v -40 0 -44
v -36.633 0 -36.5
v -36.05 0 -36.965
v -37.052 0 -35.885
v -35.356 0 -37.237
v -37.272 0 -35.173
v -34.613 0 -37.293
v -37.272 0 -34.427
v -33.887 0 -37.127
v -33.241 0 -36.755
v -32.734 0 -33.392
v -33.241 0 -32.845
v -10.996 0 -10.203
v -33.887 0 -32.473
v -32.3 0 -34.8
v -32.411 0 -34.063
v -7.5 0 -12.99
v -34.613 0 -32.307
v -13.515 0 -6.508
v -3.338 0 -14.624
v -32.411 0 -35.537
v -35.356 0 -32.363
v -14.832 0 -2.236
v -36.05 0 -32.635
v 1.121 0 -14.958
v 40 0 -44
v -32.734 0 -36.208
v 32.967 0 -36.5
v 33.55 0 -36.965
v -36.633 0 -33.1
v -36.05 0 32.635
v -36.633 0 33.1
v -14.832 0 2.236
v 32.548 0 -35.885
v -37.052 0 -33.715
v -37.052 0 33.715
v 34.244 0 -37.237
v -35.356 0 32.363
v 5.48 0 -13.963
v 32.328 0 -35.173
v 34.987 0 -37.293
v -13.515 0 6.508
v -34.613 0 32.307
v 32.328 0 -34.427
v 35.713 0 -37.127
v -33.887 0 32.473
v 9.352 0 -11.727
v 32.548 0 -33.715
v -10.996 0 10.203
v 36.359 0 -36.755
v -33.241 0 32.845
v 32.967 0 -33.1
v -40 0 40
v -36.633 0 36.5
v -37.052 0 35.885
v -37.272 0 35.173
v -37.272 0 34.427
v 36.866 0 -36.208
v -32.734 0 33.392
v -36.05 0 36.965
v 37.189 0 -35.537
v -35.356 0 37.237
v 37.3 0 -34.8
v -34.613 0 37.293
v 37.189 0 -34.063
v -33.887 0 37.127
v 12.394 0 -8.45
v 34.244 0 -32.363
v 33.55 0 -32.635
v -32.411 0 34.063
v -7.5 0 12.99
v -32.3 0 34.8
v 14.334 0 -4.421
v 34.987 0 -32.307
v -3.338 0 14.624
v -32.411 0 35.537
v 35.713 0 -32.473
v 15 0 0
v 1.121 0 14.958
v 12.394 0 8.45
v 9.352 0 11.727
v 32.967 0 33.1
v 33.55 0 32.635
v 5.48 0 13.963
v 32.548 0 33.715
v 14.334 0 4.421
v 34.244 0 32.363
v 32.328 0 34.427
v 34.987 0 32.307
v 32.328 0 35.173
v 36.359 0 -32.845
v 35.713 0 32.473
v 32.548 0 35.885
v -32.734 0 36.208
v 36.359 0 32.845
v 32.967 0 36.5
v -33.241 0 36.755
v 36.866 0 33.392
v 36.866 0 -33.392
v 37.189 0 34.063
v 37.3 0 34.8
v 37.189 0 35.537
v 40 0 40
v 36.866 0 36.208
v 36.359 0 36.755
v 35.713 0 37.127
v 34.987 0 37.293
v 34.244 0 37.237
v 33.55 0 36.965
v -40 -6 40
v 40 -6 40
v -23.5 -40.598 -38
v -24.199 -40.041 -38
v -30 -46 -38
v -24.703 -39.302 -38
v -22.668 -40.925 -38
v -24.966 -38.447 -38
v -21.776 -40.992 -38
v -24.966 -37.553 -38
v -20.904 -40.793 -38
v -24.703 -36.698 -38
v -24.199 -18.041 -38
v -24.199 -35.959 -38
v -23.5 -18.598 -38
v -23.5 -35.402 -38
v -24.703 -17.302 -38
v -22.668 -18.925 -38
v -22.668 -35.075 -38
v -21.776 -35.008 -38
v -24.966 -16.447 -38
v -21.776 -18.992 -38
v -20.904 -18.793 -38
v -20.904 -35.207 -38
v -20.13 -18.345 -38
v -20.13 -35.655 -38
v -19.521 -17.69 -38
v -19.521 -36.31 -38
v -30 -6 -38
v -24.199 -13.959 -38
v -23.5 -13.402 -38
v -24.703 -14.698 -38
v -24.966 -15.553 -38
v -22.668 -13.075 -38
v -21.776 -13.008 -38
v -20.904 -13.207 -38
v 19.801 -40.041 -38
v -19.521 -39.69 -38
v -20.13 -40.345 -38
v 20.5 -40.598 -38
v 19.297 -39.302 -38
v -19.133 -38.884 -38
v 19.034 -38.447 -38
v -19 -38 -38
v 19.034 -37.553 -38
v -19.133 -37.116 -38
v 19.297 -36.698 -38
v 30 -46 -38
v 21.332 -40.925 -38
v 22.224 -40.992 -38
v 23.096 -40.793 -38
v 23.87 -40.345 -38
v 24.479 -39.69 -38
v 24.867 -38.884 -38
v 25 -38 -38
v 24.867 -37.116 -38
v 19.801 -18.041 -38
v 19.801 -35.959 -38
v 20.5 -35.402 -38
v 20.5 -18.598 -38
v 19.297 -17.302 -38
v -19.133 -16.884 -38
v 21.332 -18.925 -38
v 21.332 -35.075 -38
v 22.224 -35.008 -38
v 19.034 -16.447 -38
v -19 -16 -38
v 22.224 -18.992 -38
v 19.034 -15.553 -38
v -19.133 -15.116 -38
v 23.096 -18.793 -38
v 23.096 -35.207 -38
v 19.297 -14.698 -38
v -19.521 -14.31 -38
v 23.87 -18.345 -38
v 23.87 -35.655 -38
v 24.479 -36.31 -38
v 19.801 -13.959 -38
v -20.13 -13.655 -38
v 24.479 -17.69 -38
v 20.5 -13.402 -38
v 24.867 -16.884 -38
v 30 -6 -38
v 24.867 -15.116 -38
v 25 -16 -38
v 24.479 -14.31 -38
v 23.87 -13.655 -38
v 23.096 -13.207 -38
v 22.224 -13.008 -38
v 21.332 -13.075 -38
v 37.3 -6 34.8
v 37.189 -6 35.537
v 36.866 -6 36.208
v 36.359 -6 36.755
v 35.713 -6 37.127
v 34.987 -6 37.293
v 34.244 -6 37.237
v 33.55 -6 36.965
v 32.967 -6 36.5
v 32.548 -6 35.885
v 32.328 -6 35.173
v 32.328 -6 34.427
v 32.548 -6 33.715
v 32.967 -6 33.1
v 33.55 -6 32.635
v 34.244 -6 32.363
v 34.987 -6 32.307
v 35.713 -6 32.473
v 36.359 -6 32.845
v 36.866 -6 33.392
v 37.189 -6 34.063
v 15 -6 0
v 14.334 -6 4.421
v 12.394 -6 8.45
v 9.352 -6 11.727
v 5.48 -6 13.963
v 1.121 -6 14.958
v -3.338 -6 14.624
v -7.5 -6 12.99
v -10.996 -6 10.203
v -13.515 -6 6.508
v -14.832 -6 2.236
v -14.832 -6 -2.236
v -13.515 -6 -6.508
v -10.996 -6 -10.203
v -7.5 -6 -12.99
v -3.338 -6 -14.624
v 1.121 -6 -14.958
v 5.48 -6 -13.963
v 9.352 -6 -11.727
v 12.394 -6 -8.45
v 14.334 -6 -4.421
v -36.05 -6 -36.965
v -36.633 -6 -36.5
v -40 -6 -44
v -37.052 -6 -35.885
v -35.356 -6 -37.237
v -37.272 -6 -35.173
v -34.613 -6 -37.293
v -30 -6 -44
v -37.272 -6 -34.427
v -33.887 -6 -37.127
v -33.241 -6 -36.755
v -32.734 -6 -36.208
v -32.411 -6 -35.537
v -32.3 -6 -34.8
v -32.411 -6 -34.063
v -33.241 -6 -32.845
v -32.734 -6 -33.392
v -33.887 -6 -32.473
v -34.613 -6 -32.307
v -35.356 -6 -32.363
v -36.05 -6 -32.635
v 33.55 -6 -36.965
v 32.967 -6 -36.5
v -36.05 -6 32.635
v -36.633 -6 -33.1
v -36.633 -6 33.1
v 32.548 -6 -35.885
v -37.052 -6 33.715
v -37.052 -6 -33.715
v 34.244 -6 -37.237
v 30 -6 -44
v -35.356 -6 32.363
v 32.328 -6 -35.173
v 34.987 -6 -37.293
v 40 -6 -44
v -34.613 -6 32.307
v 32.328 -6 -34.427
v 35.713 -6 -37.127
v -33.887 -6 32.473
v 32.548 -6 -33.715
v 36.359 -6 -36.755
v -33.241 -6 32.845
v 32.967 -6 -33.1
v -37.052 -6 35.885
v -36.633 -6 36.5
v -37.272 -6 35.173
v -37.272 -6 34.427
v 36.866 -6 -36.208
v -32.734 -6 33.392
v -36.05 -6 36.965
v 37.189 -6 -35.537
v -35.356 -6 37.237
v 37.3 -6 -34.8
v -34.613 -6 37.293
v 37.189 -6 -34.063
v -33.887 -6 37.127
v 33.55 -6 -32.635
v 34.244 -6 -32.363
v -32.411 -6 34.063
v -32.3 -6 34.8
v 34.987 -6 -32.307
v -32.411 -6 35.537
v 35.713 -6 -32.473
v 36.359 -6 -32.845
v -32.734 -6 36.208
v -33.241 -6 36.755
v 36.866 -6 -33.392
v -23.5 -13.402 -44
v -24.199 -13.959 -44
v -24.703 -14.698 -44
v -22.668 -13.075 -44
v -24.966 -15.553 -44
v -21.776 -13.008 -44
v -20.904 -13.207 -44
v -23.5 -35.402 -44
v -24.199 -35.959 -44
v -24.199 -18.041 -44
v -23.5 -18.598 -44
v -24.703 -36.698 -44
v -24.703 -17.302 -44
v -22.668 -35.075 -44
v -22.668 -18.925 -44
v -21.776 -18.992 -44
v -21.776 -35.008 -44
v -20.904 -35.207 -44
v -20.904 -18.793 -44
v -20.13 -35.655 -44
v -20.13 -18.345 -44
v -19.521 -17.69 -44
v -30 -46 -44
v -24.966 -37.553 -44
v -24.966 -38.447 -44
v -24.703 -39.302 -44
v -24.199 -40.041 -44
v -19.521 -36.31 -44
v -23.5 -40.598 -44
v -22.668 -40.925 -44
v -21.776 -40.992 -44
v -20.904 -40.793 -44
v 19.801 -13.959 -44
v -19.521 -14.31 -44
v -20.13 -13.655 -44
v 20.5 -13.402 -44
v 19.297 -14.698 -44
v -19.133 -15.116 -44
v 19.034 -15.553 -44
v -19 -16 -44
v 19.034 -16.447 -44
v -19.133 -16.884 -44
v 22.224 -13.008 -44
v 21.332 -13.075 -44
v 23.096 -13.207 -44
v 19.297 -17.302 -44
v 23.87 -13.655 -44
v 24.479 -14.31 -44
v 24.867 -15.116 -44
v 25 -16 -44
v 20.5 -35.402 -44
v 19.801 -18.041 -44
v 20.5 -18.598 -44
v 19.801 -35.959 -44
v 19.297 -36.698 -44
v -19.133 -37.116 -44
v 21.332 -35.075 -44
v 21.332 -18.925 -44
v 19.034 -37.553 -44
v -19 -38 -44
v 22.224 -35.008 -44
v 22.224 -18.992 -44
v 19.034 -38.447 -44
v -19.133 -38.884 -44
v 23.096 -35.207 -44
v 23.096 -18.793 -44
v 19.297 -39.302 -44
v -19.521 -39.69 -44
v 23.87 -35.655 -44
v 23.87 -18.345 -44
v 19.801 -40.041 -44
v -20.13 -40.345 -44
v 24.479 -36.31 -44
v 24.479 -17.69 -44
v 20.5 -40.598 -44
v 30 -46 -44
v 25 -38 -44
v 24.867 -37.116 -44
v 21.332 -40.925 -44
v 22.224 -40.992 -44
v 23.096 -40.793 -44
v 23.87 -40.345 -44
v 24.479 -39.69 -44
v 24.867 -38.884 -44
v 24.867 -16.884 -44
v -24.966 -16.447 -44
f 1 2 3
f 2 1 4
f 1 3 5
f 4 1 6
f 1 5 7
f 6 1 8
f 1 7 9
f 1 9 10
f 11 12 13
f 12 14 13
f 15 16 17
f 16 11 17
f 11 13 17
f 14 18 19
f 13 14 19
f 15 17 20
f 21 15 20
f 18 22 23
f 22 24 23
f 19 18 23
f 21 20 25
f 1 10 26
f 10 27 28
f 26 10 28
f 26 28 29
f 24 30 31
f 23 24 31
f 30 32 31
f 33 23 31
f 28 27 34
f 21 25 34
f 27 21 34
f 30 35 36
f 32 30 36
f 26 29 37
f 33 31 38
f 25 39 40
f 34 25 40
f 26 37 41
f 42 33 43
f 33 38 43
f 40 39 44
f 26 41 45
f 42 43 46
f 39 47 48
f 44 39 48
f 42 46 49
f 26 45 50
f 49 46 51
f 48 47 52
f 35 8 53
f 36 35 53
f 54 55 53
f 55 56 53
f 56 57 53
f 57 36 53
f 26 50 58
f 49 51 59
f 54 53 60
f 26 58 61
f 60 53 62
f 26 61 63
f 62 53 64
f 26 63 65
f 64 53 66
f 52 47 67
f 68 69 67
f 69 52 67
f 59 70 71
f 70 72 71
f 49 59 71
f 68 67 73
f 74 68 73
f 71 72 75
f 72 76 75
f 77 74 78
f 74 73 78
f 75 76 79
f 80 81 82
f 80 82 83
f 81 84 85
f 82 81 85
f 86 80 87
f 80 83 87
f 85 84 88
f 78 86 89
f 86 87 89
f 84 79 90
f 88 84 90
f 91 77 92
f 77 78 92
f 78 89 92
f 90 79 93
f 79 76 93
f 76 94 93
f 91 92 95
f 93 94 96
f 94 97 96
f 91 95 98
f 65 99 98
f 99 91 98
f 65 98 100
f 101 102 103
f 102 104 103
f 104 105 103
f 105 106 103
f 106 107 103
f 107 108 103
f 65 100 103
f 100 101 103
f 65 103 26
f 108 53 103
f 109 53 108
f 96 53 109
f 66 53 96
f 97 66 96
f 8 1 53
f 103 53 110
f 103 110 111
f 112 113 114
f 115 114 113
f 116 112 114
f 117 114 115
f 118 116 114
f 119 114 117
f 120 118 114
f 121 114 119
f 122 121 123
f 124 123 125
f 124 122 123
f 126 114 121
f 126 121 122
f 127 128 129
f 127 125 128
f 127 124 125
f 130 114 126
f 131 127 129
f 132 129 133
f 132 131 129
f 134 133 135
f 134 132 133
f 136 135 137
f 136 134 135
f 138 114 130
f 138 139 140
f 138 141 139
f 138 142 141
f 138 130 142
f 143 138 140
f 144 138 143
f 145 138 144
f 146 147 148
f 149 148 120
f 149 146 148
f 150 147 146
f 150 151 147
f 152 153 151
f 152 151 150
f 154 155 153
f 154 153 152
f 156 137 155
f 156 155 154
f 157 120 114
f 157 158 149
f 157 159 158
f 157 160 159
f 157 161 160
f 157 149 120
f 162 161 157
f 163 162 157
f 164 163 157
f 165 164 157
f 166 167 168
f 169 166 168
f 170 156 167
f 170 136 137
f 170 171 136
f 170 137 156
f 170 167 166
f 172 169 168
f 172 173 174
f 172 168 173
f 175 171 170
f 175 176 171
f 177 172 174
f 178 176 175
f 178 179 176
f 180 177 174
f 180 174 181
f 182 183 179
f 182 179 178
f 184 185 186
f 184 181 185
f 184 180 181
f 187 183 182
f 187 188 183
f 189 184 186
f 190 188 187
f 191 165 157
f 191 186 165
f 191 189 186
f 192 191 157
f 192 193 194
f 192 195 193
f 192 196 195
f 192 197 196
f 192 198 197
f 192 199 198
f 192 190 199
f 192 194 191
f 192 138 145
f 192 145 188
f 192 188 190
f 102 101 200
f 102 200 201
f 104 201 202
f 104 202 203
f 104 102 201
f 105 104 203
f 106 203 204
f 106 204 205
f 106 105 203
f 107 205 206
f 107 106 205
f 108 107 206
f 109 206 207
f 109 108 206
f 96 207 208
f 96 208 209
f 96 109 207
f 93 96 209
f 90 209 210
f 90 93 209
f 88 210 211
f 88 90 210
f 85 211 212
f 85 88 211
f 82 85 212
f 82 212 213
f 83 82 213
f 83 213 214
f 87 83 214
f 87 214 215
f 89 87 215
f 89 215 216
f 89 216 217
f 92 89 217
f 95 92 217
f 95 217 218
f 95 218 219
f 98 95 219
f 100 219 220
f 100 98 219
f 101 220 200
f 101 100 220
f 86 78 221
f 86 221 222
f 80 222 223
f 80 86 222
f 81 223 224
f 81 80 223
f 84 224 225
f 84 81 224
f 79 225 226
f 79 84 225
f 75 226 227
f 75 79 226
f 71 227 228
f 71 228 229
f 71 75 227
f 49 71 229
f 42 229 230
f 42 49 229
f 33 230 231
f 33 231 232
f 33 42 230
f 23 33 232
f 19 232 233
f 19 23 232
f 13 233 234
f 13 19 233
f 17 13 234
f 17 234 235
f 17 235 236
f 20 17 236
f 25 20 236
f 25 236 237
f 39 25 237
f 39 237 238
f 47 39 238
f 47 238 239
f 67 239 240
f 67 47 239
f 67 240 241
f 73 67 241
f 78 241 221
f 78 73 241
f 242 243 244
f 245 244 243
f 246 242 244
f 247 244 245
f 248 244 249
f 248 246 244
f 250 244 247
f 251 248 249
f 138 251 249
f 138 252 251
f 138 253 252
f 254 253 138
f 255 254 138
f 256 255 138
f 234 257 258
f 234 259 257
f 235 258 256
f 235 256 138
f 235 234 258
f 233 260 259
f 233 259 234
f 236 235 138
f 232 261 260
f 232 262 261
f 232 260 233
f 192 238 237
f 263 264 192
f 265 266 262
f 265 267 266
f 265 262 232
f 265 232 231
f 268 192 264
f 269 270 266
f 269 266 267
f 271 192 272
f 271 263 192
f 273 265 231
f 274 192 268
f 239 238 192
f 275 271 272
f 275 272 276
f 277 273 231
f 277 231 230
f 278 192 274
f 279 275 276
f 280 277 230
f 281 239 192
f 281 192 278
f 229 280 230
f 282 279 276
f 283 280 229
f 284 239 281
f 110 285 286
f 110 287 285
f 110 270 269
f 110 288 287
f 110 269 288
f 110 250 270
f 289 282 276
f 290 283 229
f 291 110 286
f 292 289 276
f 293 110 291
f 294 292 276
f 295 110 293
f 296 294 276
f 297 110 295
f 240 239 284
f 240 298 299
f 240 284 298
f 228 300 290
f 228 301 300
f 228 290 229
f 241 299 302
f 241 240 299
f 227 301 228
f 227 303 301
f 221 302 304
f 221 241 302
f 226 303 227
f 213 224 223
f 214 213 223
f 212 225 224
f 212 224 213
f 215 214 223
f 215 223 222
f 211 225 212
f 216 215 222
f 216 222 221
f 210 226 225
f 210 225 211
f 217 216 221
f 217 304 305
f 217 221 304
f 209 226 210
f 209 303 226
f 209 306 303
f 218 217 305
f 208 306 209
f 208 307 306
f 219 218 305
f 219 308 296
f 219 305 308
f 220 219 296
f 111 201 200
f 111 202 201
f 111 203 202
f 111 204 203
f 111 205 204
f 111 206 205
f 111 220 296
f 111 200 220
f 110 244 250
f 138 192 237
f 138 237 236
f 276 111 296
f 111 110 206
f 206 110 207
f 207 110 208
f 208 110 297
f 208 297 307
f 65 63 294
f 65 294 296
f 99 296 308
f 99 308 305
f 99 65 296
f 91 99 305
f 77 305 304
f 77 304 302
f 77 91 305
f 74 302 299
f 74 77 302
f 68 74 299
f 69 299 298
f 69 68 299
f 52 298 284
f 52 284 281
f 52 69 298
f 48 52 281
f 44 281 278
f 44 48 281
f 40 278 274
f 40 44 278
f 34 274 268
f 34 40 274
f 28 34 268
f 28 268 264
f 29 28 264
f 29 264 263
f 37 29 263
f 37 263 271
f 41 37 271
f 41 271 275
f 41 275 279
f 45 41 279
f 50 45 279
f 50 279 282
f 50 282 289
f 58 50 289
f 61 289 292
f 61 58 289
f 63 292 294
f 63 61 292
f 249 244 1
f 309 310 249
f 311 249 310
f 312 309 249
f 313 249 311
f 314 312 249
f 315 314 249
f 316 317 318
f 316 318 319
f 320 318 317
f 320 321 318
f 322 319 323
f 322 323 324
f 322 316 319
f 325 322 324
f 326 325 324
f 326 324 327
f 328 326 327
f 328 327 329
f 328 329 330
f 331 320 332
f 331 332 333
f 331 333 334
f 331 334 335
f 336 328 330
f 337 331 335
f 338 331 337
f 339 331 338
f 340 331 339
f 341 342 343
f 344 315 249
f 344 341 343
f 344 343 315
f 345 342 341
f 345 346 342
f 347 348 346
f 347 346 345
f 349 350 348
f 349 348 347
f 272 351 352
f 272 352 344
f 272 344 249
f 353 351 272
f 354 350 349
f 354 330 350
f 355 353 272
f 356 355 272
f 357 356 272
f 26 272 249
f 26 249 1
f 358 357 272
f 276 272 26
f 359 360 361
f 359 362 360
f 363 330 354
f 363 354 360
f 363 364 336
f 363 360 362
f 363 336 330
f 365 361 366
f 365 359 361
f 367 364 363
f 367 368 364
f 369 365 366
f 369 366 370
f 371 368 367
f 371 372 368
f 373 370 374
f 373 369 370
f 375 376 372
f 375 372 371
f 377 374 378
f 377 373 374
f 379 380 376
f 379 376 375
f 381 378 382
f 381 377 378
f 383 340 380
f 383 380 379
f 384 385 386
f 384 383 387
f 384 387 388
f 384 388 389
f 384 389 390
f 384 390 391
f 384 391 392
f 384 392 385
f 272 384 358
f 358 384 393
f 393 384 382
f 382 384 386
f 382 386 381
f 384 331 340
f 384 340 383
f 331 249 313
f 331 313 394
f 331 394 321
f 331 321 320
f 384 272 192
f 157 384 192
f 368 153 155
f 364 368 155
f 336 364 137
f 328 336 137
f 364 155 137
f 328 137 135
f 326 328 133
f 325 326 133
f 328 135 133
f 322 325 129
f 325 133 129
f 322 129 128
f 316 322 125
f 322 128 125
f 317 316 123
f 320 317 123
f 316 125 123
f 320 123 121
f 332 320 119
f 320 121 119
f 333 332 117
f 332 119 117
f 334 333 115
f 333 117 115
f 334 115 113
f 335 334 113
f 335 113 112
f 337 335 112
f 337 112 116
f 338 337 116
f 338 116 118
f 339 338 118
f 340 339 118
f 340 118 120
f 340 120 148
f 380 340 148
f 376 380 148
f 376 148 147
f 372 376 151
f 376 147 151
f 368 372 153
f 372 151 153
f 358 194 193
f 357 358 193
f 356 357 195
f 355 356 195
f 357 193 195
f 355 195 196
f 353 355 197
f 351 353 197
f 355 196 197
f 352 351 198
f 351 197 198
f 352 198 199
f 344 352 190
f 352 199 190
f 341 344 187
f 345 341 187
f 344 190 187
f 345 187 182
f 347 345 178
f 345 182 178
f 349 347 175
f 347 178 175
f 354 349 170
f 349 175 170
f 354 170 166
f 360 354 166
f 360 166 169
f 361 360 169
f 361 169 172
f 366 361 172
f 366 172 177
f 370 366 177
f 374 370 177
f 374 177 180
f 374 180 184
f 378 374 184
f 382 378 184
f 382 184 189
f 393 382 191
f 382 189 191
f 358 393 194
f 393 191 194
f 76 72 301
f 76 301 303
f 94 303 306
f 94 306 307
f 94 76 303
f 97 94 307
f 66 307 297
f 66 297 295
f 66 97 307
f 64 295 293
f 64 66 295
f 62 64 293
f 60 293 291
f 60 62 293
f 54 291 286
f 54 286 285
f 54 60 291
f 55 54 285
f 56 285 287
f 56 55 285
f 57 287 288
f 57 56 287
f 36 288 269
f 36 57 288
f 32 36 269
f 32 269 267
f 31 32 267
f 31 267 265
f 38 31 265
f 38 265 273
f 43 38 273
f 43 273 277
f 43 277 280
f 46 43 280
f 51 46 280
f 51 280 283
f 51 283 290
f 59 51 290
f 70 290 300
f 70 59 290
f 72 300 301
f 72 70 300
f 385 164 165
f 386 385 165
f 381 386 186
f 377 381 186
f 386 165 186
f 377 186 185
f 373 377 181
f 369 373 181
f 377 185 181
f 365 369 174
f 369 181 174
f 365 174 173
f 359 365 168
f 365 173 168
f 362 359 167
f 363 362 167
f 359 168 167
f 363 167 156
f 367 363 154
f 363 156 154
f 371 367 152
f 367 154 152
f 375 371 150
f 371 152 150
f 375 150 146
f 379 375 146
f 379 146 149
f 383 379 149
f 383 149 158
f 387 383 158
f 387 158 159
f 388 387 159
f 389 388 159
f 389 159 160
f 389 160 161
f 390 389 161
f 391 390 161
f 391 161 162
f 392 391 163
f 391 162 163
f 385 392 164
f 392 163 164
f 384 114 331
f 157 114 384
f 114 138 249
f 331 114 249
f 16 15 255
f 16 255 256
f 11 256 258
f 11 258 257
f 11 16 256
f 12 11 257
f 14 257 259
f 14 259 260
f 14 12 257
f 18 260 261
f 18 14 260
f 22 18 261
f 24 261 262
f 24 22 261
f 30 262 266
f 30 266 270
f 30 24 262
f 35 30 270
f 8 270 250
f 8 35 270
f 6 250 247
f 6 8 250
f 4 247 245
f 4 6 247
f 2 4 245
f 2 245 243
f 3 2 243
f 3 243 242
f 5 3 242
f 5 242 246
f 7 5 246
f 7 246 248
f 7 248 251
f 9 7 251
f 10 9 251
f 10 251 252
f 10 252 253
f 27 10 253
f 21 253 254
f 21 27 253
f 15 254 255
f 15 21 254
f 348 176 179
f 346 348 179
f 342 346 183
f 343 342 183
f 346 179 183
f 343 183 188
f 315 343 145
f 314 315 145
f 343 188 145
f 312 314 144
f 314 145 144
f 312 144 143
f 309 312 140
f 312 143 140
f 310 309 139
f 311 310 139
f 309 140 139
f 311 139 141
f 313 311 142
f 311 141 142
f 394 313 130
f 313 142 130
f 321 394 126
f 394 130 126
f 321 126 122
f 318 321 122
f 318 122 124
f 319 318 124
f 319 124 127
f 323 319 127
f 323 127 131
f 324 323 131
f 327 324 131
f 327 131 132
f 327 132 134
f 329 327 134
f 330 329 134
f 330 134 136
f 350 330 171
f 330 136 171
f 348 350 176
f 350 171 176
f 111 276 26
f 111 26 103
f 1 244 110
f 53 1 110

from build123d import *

# Parameters (mm, degrees)
F0_W     = 80
F0_H     = 80
F0_R     = 2.5
F0_R_2   = 15
F1_DEPTH = 6
F2_W     = 60
F2_H     = 2
F2_H_2   = 4
F3_DEPTH = 40
F4_R     = 3
F5_DEPTH = 6
F6_W     = 80
F6_H     = 4
F7_DEPTH = 6


with BuildPart() as f1:
    # F0 (on Front) → F1 (new body)
    with BuildSketch(Plane.XZ):
        Rectangle(F0_W, F0_H)
        with Locations((-34.8, -34.8)):
            Circle(F0_R, mode=Mode.SUBTRACT)
        with Locations((34.8, -34.8)):
            Circle(F0_R, mode=Mode.SUBTRACT)
        with Locations((-34.8, 34.8)):
            Circle(F0_R, mode=Mode.SUBTRACT)
        Circle(F0_R_2, mode=Mode.SUBTRACT)
        with Locations((34.8, 34.8)):
            Circle(F0_R, mode=Mode.SUBTRACT)
    extrude(amount=F1_DEPTH)

    # F2 (on face) → F3 (join)
    with BuildSketch(Plane.XZ.offset(6)):
        with Locations((0, -39)):
            Rectangle(F2_W, F2_H)
        with Locations((0, -42)):
            Rectangle(F2_W, F2_H_2)
    extrude(amount=F3_DEPTH)

    # F4 (on face) → F5 (cut, through all)
    with BuildSketch(Plane.XY.offset(-38)):
        with Locations((-22, -38)):
            Circle(F4_R)
        with Locations((-22, -16)):
            Circle(F4_R)
        with Locations((22, -16)):
            Circle(F4_R)
        with Locations((22, -38)):
            Circle(F4_R)
    extrude(amount=-F5_DEPTH, mode=Mode.SUBTRACT)

    # F6 (on face) → F7 (join, through all)
    with BuildSketch(Plane.XZ.offset(6)):
        with Locations((0, -42)):
            Rectangle(F6_W, F6_H)
    extrude(amount=-F7_DEPTH)


solid = f1.part
